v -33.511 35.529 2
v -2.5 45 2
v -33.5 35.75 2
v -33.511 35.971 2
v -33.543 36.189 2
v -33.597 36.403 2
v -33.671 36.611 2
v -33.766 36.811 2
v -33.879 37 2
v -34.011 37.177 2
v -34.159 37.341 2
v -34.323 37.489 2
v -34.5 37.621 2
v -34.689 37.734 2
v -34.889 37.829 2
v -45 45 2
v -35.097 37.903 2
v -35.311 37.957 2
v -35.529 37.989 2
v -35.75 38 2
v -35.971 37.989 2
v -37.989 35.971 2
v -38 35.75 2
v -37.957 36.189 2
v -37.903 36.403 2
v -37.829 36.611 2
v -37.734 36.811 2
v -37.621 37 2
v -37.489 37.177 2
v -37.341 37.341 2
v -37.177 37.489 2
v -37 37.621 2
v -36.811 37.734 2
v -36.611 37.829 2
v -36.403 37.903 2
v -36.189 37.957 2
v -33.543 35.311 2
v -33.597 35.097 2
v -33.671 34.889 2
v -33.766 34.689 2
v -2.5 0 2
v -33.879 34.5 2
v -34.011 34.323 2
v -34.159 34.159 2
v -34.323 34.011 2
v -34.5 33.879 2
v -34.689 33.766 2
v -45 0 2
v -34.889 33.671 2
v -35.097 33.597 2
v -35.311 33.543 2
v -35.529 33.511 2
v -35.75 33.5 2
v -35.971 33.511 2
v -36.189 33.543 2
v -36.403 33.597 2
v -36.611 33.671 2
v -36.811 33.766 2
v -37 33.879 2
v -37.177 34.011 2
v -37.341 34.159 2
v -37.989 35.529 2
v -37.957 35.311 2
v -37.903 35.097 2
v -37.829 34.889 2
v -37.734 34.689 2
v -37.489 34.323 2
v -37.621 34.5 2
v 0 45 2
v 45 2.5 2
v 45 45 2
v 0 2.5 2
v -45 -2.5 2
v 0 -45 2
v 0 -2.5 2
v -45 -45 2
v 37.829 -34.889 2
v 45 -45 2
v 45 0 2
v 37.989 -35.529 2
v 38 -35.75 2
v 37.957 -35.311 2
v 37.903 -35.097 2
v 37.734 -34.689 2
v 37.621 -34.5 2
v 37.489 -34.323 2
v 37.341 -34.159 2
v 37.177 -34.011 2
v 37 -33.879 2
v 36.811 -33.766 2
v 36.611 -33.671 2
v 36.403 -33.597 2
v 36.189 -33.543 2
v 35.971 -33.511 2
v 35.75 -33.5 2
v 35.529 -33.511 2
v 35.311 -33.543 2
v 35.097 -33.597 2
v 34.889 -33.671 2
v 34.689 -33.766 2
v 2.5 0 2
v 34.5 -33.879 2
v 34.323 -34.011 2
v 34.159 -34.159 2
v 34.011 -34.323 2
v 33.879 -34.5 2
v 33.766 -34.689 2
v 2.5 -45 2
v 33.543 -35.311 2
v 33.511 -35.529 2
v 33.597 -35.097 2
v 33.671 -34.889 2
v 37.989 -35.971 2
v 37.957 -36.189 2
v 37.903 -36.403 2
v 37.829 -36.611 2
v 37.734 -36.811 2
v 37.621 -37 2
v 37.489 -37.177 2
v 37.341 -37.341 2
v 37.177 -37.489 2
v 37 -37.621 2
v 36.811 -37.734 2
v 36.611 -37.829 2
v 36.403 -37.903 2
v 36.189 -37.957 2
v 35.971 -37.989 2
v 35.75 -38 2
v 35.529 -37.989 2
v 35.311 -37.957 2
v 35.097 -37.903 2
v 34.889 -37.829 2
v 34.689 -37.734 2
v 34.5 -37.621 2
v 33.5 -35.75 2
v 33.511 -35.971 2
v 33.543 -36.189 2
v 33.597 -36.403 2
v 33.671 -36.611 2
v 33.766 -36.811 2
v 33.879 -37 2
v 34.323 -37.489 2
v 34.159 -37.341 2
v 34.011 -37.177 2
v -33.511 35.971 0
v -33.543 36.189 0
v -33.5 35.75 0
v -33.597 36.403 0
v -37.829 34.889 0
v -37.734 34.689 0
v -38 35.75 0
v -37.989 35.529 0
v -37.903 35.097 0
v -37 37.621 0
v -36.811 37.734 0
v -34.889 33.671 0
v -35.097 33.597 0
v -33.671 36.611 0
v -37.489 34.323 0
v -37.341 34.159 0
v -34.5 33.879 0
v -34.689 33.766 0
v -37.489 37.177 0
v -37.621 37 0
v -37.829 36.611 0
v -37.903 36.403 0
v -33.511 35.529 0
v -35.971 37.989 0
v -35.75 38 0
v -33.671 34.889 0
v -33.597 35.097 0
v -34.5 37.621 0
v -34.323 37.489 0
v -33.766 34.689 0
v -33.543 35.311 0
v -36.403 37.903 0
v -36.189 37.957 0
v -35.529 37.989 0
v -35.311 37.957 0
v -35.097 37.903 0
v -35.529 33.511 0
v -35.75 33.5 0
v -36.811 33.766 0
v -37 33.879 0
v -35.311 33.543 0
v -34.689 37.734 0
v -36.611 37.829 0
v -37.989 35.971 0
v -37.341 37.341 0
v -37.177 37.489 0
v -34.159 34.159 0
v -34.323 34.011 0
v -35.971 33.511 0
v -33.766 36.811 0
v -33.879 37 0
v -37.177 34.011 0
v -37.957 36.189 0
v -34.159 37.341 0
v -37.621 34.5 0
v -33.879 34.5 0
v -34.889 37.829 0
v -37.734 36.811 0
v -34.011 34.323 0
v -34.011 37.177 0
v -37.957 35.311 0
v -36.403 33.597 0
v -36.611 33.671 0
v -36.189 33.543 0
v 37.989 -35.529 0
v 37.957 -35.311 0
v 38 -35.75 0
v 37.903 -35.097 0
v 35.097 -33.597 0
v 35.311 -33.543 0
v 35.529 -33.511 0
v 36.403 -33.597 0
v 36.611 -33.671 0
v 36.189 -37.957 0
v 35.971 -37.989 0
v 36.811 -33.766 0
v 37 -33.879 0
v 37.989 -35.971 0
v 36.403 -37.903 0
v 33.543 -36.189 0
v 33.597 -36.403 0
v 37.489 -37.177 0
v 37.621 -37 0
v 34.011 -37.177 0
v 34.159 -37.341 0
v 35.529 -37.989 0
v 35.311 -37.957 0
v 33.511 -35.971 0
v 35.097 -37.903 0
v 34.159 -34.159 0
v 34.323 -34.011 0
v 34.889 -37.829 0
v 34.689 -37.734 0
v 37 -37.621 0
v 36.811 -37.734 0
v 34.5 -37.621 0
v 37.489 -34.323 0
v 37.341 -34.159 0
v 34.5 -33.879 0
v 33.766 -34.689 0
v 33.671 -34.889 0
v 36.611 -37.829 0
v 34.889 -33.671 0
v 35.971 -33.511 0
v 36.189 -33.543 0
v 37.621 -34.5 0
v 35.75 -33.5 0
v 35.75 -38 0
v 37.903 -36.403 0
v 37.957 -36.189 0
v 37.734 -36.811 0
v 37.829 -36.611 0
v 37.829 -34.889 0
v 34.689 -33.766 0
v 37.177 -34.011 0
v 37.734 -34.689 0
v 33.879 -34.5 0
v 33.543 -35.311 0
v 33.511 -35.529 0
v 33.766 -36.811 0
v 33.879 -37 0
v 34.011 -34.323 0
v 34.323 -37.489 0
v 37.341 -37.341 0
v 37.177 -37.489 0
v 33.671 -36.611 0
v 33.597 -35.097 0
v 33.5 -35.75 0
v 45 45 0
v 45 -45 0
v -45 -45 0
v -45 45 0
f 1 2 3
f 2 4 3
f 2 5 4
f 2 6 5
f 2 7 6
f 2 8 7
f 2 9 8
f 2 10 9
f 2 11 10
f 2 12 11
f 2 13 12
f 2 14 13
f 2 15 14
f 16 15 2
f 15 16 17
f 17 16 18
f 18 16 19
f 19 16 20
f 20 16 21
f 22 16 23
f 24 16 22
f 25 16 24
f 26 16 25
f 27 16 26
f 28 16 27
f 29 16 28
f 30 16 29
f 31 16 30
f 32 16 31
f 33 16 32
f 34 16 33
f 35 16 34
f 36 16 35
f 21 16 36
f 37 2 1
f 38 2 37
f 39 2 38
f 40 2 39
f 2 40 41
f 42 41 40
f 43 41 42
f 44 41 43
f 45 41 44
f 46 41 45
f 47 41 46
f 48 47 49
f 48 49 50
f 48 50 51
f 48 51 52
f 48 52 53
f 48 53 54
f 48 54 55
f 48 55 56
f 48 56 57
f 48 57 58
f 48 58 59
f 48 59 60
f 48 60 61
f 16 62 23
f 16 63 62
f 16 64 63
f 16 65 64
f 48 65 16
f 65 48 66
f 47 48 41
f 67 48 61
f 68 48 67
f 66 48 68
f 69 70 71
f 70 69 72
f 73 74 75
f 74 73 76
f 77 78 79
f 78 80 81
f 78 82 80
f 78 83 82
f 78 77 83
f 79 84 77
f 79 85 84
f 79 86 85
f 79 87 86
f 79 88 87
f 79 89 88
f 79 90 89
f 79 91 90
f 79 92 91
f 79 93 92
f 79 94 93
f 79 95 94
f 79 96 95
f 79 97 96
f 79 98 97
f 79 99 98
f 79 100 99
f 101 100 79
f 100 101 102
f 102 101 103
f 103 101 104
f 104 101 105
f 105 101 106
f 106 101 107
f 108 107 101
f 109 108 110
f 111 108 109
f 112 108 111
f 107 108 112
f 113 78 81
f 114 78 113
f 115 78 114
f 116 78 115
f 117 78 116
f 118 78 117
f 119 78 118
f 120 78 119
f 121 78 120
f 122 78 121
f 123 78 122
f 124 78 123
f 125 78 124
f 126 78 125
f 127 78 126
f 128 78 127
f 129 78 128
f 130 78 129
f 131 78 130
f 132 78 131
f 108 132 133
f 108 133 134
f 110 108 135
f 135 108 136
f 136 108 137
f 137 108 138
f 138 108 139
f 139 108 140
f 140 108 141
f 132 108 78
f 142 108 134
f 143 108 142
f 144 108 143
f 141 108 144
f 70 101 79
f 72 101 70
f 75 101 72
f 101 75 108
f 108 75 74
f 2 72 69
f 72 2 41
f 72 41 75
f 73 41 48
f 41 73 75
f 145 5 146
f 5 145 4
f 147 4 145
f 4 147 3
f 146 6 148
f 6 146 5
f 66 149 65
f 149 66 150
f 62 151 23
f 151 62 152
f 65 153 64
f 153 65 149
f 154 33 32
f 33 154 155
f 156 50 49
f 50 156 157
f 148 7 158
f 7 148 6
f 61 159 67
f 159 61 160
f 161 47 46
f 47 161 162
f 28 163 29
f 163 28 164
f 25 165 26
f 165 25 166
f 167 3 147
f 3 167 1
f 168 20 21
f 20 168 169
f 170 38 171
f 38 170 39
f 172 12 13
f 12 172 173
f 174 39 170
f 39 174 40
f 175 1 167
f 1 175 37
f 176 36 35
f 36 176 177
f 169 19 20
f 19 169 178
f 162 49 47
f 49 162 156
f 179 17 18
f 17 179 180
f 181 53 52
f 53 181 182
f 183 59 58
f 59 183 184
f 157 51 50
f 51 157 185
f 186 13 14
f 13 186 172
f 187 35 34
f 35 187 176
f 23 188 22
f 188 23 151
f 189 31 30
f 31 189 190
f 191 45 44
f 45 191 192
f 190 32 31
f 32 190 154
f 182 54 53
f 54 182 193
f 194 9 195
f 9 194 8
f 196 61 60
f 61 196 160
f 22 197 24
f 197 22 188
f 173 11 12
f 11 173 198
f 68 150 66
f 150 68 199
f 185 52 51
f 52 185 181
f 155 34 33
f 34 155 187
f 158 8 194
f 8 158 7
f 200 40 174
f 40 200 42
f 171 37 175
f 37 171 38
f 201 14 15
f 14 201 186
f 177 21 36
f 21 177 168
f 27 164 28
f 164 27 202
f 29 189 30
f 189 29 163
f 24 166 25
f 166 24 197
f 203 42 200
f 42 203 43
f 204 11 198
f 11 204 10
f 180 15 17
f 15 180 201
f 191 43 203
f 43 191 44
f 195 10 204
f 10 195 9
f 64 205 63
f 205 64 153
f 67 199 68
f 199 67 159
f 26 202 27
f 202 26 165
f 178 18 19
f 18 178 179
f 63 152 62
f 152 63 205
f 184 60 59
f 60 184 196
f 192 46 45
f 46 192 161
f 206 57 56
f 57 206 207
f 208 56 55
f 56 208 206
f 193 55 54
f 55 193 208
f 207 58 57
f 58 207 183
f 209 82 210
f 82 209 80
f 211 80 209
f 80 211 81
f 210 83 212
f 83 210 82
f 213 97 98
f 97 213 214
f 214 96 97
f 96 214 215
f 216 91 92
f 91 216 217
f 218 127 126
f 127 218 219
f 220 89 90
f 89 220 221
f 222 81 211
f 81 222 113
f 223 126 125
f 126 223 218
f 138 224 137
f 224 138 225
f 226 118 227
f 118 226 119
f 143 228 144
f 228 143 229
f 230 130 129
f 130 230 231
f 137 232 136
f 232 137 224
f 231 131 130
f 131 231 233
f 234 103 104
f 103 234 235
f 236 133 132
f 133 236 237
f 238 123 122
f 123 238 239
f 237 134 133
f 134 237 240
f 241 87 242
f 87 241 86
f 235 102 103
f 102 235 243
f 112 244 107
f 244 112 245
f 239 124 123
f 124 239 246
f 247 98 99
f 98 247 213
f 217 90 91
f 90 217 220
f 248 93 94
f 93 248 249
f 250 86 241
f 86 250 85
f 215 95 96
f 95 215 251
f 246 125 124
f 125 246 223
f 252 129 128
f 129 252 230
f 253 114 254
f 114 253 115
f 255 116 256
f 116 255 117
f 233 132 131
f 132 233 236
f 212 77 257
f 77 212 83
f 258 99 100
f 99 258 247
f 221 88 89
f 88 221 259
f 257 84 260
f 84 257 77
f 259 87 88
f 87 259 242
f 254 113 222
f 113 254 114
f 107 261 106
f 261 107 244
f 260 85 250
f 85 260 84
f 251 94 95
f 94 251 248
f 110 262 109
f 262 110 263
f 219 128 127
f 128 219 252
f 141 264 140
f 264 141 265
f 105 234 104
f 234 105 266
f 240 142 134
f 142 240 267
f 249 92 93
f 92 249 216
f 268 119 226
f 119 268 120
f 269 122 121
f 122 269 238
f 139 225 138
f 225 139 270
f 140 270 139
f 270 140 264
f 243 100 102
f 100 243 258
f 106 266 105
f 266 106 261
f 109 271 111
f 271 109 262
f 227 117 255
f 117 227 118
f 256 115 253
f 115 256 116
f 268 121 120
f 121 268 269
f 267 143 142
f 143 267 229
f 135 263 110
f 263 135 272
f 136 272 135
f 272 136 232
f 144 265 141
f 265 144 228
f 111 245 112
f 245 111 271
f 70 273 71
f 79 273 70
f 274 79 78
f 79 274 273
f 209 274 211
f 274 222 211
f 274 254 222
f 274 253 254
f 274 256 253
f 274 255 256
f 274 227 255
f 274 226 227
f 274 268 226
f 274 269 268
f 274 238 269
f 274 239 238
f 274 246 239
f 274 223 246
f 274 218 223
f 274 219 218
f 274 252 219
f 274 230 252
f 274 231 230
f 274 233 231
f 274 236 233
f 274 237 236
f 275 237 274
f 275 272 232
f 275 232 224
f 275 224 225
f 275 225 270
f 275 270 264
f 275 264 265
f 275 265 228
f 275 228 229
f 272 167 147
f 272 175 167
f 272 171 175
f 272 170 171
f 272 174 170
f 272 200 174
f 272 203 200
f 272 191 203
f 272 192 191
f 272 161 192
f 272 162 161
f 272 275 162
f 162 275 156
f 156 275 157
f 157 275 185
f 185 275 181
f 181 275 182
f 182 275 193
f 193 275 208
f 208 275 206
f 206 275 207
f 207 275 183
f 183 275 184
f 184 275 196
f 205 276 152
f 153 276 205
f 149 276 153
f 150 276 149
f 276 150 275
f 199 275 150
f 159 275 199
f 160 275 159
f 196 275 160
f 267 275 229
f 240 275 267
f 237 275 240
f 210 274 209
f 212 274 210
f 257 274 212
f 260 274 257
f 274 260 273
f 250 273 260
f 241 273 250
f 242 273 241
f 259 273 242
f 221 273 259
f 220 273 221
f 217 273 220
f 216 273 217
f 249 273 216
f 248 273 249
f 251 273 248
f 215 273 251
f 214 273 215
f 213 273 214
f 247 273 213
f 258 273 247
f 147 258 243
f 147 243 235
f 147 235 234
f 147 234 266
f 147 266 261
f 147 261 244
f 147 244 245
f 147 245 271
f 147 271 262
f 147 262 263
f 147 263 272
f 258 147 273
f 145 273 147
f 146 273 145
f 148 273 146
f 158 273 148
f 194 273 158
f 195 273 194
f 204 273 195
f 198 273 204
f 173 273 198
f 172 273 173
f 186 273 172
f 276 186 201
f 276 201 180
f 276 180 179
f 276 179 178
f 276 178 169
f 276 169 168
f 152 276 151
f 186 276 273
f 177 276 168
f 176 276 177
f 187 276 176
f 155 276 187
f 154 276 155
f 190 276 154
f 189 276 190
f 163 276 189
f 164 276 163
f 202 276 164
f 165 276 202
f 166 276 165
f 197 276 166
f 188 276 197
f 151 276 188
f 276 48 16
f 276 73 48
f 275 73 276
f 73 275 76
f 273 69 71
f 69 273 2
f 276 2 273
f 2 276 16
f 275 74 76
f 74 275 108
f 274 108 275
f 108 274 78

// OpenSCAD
// Magnetic stirrer housing - upside-down open box over a 80 mm PC fan
// Print orientation: top plate on bed (z = 0), walls rise to open top (z = 40)

// ---------- Parameters ----------
plate_t      = 2;     // top plate thickness
wall_t       = 2.5;   // wall thickness
box_h        = 40;    // total height of box (open top)
outer_x      = 90;    // outer size in X
outer_y      = 90;    // outer size in Y
screw_d      = 4.5;   // M4 screw hole diameter
screw_pitch  = 71.5;  // square pattern pitch for screw holes
notch_w      = 12;    // cable notch width
notch_depth  = 8;     // cable notch depth from open edge (z = 32 to 40)
eps          = 0.5;   // cutter overshoot past faces

$fn = 64;

// ---------- Model ----------
difference() {
    // Closed top plate
    translate([-outer_x/2, -outer_y/2, 0])
        cube([outer_x, outer_y, plate_t]);

    // Four walls, open top, with screw holes through the top plate
    for (i = [0 : 3]) {
        rotate([0, 0, i * 90])
            translate([0, 0, plate_t])
                cube([outer_x, wall_t, box_h - plate_t]);
    }

    // Screw holes, centred on the plate
    for (j = [0 : 3]) {
        x = (j < 2) ? -screw_pitch/2 : screw_pitch/2;
        y = (j > 1) ? -screw_pitch/2 : screw_pitch/2;
        translate([x, y, -eps])
            cylinder(d = screw_d, h = plate_t + 2 * eps);
    }

    // Cable notch in one wall, centred along the wall
    translate([-outer_x/2 + notch_w/2, -wall_t/2, box_h - notch_depth])
        cube([notch_w, wall_t + eps, notch_depth + eps]);
}
